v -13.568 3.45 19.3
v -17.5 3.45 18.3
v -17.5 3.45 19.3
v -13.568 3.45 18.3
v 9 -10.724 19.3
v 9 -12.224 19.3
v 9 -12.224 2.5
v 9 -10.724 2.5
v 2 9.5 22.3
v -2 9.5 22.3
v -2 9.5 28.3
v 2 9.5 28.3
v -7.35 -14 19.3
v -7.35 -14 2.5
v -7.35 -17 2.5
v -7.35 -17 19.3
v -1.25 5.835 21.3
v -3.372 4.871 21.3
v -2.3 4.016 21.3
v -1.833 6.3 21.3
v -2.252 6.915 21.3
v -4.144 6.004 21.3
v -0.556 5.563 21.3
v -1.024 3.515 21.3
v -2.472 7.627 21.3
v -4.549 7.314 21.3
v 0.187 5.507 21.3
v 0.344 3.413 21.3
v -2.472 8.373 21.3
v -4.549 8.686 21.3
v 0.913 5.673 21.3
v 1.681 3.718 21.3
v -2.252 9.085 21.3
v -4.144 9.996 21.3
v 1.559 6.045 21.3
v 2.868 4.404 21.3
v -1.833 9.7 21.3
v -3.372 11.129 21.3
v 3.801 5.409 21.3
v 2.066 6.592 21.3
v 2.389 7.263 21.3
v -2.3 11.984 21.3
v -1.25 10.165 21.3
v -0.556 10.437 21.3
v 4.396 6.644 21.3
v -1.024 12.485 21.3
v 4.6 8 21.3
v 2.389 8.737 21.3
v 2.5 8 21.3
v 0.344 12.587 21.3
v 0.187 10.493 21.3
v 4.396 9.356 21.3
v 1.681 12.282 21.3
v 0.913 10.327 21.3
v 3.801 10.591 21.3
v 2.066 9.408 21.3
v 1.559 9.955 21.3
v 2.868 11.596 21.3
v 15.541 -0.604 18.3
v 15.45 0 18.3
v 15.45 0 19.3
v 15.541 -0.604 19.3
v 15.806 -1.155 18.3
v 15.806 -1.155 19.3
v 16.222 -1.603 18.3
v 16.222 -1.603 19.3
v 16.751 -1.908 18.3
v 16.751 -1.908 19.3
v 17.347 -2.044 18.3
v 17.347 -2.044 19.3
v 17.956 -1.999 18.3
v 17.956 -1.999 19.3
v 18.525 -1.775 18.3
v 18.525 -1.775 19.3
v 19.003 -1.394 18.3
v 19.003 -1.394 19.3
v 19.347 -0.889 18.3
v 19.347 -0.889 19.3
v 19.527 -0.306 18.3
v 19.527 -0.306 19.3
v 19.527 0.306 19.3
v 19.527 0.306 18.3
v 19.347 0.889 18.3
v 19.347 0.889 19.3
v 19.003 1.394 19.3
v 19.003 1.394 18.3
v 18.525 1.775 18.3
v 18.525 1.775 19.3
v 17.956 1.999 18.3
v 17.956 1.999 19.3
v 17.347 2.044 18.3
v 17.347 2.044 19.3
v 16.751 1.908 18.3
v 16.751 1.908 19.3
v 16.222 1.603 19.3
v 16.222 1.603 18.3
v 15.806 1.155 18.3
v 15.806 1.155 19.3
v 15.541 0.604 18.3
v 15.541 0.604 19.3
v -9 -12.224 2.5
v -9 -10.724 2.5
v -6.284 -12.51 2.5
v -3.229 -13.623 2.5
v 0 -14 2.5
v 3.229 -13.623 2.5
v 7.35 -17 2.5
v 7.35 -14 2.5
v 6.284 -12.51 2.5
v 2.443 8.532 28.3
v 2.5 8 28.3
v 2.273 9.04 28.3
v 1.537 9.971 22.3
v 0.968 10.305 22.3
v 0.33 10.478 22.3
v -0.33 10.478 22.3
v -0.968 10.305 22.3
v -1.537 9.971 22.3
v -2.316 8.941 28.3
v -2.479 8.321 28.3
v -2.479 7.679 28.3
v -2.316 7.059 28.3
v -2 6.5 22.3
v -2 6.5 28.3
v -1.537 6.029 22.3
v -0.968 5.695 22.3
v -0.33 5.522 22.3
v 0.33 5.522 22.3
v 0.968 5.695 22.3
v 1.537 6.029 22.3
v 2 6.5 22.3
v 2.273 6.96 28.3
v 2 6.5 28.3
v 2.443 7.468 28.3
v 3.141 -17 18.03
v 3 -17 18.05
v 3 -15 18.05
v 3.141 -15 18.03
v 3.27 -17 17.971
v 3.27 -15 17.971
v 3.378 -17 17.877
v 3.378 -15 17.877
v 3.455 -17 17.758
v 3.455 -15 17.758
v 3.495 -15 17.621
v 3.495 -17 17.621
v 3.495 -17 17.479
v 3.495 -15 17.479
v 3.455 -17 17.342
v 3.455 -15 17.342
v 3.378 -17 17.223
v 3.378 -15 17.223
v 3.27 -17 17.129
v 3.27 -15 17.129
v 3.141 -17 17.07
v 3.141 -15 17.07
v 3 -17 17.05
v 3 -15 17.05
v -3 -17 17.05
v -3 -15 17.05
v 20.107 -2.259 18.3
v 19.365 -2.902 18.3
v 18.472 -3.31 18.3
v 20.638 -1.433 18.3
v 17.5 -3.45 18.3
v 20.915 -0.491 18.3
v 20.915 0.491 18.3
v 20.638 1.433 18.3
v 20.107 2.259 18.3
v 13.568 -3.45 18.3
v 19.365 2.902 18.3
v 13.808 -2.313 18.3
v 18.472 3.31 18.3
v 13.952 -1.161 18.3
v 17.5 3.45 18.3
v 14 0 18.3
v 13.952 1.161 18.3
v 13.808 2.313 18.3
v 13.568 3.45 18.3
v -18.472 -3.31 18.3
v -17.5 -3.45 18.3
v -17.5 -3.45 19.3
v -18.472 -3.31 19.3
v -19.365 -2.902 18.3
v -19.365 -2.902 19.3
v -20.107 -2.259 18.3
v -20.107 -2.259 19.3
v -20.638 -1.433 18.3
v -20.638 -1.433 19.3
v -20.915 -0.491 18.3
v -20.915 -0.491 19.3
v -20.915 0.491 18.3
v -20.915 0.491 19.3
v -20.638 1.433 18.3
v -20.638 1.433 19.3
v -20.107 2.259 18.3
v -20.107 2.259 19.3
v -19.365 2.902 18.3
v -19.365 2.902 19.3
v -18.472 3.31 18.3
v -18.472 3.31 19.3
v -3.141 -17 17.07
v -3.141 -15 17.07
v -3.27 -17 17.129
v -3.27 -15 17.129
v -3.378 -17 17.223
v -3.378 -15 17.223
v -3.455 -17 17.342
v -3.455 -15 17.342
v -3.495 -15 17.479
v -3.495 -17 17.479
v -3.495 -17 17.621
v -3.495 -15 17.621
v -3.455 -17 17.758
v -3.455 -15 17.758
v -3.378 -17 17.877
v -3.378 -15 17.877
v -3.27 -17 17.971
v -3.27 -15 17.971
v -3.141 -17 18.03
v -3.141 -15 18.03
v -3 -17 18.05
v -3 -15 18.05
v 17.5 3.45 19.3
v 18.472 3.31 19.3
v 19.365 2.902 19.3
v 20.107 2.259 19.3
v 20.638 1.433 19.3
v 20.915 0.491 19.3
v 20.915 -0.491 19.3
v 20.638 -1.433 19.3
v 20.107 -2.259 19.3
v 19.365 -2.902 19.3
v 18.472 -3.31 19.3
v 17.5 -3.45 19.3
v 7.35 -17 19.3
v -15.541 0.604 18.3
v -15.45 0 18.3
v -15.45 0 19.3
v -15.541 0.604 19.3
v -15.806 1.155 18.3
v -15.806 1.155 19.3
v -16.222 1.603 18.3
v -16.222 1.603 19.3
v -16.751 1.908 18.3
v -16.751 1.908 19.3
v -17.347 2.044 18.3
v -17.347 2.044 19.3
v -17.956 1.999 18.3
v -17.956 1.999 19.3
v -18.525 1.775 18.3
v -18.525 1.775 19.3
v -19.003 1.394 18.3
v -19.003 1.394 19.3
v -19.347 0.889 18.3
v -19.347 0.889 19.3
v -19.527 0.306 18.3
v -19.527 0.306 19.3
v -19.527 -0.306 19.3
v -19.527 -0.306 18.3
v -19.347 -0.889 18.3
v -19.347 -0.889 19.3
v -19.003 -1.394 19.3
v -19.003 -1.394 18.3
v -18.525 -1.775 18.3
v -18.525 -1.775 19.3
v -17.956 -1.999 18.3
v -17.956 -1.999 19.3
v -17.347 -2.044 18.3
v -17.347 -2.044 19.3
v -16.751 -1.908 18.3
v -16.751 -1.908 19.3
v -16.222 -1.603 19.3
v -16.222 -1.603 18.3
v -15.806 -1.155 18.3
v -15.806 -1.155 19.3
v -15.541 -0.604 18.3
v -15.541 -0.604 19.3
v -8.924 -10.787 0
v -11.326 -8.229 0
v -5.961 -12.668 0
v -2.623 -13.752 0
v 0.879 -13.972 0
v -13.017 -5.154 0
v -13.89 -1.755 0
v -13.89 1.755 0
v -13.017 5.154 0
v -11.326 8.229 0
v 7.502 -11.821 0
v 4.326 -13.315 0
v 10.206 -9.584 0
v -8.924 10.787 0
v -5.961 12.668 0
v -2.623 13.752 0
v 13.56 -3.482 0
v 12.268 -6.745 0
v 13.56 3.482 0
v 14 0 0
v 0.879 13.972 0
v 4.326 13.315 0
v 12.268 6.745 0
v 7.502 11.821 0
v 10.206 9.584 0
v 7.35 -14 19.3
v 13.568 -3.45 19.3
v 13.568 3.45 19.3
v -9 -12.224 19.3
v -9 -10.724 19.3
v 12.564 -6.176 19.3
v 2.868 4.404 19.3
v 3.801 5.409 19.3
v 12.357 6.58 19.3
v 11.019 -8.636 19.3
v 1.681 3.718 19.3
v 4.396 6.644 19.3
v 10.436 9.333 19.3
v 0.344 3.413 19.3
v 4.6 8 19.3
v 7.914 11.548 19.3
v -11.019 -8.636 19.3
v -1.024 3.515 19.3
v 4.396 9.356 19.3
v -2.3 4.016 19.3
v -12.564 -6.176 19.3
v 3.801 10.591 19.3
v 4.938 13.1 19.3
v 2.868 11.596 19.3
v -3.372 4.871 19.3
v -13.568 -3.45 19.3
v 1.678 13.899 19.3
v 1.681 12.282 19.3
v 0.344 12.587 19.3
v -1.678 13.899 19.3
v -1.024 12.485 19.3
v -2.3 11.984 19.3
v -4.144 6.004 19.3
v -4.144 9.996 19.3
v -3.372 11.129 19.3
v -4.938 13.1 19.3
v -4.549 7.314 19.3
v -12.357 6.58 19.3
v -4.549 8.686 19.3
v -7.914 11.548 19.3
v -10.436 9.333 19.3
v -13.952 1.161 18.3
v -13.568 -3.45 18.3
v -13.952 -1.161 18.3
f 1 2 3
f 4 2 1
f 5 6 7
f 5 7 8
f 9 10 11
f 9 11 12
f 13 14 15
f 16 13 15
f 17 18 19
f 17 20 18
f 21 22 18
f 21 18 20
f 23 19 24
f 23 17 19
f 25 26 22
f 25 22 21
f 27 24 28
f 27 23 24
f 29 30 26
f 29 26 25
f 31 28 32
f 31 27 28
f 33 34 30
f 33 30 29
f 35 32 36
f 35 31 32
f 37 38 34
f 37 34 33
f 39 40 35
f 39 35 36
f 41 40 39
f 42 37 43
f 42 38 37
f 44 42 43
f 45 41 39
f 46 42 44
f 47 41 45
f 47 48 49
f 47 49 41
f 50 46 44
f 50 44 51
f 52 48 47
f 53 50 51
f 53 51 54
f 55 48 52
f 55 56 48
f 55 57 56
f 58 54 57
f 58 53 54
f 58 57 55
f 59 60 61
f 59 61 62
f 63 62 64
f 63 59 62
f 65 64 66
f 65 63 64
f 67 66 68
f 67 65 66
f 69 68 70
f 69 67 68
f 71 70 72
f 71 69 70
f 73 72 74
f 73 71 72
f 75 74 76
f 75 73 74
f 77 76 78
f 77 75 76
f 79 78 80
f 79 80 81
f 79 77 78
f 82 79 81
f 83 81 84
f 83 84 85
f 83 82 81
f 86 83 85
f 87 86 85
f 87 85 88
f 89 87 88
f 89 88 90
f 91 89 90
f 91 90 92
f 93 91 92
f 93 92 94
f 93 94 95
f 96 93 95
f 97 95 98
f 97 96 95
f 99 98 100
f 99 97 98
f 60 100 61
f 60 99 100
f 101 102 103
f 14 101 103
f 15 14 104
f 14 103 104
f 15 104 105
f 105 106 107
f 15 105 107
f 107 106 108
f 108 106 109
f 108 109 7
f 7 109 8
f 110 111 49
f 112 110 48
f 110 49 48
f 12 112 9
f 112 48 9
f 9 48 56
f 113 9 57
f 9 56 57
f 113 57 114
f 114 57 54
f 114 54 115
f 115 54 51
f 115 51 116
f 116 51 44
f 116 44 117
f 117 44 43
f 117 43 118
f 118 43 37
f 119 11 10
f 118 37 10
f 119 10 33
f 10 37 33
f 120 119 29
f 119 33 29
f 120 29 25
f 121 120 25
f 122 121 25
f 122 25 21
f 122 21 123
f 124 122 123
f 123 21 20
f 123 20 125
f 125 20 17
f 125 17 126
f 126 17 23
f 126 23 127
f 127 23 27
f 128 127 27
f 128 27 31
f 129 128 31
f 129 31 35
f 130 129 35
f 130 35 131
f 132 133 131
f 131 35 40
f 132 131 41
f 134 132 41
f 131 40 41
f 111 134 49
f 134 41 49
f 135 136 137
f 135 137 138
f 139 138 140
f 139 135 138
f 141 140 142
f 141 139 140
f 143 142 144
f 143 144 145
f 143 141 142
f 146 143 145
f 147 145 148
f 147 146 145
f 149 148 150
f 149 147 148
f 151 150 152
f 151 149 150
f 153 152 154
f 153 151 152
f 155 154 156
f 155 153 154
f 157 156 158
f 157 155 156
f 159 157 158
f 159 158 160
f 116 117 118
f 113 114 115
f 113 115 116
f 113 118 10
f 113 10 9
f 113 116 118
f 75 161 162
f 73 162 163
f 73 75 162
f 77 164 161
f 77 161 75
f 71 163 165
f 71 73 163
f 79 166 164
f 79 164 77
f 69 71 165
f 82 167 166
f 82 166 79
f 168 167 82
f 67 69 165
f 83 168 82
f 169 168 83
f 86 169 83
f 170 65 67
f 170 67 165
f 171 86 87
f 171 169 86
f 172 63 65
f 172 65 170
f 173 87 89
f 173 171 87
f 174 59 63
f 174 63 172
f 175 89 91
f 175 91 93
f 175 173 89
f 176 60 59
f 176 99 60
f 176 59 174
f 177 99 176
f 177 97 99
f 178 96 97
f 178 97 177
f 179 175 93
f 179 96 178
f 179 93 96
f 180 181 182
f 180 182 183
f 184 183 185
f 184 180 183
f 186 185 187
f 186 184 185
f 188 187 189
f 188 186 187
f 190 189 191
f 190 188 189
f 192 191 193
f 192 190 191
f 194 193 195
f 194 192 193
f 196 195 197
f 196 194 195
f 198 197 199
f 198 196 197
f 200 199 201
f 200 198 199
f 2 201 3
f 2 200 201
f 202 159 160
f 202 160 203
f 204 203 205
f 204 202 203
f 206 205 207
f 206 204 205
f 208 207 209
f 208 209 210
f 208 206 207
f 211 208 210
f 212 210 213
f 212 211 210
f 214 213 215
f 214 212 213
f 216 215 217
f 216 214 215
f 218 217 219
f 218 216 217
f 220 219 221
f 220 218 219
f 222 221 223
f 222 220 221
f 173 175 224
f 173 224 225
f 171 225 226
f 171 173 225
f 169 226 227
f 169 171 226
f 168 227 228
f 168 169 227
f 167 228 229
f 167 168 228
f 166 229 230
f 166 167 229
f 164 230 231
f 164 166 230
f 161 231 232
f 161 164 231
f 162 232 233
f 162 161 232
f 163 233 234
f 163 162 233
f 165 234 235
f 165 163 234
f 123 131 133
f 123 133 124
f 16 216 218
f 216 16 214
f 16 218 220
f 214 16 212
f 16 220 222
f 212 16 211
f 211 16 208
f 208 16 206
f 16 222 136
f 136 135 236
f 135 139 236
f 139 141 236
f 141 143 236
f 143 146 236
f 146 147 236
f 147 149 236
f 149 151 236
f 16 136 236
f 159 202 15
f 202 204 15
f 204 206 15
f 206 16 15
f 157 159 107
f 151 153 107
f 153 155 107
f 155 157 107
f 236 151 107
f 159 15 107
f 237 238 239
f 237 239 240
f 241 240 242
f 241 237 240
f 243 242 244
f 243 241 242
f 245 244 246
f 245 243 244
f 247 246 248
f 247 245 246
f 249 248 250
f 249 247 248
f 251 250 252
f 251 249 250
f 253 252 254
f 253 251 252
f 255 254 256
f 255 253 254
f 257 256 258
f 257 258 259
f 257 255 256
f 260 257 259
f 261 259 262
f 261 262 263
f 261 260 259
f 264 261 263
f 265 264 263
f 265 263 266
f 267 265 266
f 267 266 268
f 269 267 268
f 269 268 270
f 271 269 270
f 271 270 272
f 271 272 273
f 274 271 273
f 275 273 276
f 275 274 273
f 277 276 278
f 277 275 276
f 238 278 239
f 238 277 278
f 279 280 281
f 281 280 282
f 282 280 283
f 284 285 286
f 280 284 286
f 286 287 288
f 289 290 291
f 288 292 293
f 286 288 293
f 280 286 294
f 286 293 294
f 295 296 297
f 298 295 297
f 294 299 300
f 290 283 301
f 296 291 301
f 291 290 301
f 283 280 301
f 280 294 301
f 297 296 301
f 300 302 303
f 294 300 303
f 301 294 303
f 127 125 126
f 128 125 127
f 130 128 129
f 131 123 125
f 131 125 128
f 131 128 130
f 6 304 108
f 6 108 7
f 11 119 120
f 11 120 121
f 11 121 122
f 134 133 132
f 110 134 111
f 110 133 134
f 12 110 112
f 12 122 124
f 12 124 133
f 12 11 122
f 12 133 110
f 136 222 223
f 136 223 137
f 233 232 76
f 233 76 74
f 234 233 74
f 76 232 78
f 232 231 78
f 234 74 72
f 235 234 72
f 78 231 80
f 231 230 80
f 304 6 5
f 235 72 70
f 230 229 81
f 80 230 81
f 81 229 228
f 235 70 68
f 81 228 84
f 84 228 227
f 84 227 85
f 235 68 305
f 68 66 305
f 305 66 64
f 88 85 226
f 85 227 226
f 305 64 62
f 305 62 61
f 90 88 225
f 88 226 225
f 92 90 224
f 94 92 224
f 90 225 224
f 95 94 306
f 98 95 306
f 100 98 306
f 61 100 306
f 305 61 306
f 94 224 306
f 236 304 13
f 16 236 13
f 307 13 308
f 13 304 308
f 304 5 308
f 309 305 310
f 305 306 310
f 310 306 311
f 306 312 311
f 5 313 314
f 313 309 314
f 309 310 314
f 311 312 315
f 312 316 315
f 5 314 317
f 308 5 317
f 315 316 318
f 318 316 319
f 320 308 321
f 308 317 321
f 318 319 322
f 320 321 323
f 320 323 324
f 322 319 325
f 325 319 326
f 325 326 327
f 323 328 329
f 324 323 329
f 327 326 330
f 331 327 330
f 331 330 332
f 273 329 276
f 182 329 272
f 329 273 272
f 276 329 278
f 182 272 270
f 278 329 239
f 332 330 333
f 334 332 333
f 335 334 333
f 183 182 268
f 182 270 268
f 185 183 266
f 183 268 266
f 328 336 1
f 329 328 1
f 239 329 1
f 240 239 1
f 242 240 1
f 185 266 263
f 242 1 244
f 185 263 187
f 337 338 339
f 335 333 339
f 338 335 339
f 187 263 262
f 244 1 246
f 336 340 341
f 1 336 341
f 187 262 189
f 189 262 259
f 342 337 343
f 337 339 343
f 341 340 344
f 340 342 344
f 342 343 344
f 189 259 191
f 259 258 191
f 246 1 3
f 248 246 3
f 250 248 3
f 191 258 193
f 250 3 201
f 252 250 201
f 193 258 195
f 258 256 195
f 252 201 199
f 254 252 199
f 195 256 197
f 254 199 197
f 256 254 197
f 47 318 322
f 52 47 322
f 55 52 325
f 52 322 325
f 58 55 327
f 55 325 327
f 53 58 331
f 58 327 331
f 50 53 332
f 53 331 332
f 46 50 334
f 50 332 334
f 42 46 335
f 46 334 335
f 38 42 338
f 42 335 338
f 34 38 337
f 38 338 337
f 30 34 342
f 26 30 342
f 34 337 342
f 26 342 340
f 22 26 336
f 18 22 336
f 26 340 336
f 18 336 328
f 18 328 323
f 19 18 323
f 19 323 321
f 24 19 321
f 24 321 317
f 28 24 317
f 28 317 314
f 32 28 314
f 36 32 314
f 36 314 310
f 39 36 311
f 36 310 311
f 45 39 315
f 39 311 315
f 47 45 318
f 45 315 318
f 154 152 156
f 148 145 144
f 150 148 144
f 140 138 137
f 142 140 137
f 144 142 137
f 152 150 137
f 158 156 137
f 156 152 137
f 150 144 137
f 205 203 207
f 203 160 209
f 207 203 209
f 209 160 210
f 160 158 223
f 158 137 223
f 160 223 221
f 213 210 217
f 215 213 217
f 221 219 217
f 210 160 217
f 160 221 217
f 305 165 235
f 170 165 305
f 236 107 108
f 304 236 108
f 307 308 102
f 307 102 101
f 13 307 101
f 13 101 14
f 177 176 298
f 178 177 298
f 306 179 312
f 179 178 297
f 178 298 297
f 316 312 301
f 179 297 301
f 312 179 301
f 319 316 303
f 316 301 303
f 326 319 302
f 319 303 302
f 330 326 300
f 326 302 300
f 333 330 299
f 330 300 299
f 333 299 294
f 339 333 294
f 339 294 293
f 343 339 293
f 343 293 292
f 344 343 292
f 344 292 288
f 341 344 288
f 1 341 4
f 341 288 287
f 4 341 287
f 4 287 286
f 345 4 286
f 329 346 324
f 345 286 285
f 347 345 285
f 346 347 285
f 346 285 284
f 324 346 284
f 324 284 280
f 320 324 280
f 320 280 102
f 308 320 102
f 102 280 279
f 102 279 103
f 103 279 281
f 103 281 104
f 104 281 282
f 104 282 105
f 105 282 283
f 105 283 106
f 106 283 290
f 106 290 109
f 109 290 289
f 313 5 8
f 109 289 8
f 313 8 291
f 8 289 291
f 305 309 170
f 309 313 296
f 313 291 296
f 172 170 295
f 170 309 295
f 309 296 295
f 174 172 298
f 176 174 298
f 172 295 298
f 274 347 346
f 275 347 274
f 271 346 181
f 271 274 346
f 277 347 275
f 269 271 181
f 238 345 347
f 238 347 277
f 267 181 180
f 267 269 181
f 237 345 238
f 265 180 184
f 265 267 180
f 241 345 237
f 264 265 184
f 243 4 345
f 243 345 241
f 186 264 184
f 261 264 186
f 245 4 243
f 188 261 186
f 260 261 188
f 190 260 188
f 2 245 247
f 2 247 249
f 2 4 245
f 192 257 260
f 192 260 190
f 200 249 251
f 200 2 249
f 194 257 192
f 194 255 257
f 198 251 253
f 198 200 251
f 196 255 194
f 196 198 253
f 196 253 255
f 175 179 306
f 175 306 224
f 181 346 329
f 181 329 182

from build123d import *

# Parameters (mm, degrees)
SKETCH1_R           = 14
BOSS_EXTRUDE1_DEPTH = 19.3
BOSS_EXTRUDE2_START = -16.8
BOSS_EXTRUDE2_DEPTH = 16.8
CUT_EXTRUDE1_DEPTH  = 2
BOSS_EXTRUDE3_START = -1
SKETCH5_R           = 2.05
BOSS_EXTRUDE3_DEPTH = 1
SKETCH6_R           = 4.6
BOSS_EXTRUDE4_DEPTH = 2
SKETCH7_R           = 2.5
BOSS_EXTRUDE5_DEPTH = 7
CUT_EXTRUDE2_START  = -6
CUT_EXTRUDE2_DEPTH  = 6


with BuildPart() as part:
    # Sketch1 → Boss-Extrude1 (new body)
    with BuildSketch(Plane.XY):
        Circle(SKETCH1_R)
    extrude(amount=BOSS_EXTRUDE1_DEPTH)

    # Sketch2 → Boss-Extrude2 (add)
    with BuildSketch(Plane.XY.offset(19.3).offset(BOSS_EXTRUDE2_START)):
        with BuildLine():
            Line((-7.35, -17), (7.35, -17))
            Line((7.35, -17), (7.35, -14))
            Line((7.35, -14), (9, -12.223805295))
            Line((9, -12.223805295), (9, -10.723805295))
            ThreePointArc((9, -10.723805295), (0, -14), (-9, -10.723805295))
            Line((-9, -10.723805295), (-9, -12.223805295))
            Line((-9, -12.223805295), (-7.35, -14))
            Line((-7.35, -14), (-7.35, -17))
        make_face()
    extrude(amount=BOSS_EXTRUDE2_DEPTH)

    # Sketch4 → Cut-Extrude1 (cut)
    with BuildSketch(Plane.XZ.offset(17)):
        with BuildLine():
            Line((-3, 18.05), (3, 18.05))
            ThreePointArc((3, 18.05), (3.5, 17.55), (3, 17.05))
            Line((3, 17.05), (-3, 17.05))
            ThreePointArc((-3, 17.05), (-3.5, 17.55), (-3, 18.05))
        make_face()
    extrude(amount=-CUT_EXTRUDE1_DEPTH, mode=Mode.SUBTRACT)

    # Sketch5 → Boss-Extrude3 (add)
    # profile 1 of 2: a face of its own
    with BuildSketch(Plane.XY.offset(19.3).offset(BOSS_EXTRUDE3_START)):
        with BuildLine():
            Line((-17.5, 3.45), (-13.568253388, 3.45))
            ThreePointArc((-13.568253388, 3.45), (-14, 0), (-13.568253388, -3.45))
            Line((-13.568253388, -3.45), (-17.5, -3.45))
            ThreePointArc((-17.5, -3.45), (-20.95, 0), (-17.5, 3.45))
        make_face()
        with Locations((-17.5, 0)):
            Circle(SKETCH5_R, mode=Mode.SUBTRACT)
    # profile 2 of 2: a face of its own
    with BuildSketch(Plane.XY.offset(19.3).offset(BOSS_EXTRUDE3_START)):
        with BuildLine():
            Line((17.5, -3.45), (13.568253388, -3.45))
            ThreePointArc((13.568253388, -3.45), (14, 0), (13.568253388, 3.45))
            Line((13.568253388, 3.45), (17.5, 3.45))
            ThreePointArc((17.5, 3.45), (20.95, 0), (17.5, -3.45))
        make_face()
        with Locations(Location((17.5, 0, 0), (0, 0, 180))):
            Circle(SKETCH5_R, mode=Mode.SUBTRACT)
    extrude(amount=BOSS_EXTRUDE3_DEPTH)

    # Sketch6 → Boss-Extrude4 (add)
    with BuildSketch(Plane.XY.offset(19.3)):
        with Locations((0, 8)):
            Circle(SKETCH6_R)
    extrude(amount=BOSS_EXTRUDE4_DEPTH)

    # Sketch7 → Boss-Extrude5 (add)
    with BuildSketch(Plane.XY.offset(21.3)):
        with Locations((0, 8)):
            Circle(SKETCH7_R)
    extrude(amount=BOSS_EXTRUDE5_DEPTH)

    # Sketch8 → Cut-Extrude2 (cut)
    with BuildSketch(Plane.XY.offset(28.3).offset(CUT_EXTRUDE2_START)):
        with BuildLine():
            ThreePointArc((2, 9.5), (0, 10.5), (-2, 9.5))
            Line((-2, 9.5), (2, 9.5))
        make_face()
        with BuildLine():
            Line((2, 6.5), (-2, 6.5))
            ThreePointArc((-2, 6.5), (0, 5.5), (2, 6.5))
        make_face()
    extrude(amount=CUT_EXTRUDE2_DEPTH, mode=Mode.SUBTRACT)


solid = part.part
